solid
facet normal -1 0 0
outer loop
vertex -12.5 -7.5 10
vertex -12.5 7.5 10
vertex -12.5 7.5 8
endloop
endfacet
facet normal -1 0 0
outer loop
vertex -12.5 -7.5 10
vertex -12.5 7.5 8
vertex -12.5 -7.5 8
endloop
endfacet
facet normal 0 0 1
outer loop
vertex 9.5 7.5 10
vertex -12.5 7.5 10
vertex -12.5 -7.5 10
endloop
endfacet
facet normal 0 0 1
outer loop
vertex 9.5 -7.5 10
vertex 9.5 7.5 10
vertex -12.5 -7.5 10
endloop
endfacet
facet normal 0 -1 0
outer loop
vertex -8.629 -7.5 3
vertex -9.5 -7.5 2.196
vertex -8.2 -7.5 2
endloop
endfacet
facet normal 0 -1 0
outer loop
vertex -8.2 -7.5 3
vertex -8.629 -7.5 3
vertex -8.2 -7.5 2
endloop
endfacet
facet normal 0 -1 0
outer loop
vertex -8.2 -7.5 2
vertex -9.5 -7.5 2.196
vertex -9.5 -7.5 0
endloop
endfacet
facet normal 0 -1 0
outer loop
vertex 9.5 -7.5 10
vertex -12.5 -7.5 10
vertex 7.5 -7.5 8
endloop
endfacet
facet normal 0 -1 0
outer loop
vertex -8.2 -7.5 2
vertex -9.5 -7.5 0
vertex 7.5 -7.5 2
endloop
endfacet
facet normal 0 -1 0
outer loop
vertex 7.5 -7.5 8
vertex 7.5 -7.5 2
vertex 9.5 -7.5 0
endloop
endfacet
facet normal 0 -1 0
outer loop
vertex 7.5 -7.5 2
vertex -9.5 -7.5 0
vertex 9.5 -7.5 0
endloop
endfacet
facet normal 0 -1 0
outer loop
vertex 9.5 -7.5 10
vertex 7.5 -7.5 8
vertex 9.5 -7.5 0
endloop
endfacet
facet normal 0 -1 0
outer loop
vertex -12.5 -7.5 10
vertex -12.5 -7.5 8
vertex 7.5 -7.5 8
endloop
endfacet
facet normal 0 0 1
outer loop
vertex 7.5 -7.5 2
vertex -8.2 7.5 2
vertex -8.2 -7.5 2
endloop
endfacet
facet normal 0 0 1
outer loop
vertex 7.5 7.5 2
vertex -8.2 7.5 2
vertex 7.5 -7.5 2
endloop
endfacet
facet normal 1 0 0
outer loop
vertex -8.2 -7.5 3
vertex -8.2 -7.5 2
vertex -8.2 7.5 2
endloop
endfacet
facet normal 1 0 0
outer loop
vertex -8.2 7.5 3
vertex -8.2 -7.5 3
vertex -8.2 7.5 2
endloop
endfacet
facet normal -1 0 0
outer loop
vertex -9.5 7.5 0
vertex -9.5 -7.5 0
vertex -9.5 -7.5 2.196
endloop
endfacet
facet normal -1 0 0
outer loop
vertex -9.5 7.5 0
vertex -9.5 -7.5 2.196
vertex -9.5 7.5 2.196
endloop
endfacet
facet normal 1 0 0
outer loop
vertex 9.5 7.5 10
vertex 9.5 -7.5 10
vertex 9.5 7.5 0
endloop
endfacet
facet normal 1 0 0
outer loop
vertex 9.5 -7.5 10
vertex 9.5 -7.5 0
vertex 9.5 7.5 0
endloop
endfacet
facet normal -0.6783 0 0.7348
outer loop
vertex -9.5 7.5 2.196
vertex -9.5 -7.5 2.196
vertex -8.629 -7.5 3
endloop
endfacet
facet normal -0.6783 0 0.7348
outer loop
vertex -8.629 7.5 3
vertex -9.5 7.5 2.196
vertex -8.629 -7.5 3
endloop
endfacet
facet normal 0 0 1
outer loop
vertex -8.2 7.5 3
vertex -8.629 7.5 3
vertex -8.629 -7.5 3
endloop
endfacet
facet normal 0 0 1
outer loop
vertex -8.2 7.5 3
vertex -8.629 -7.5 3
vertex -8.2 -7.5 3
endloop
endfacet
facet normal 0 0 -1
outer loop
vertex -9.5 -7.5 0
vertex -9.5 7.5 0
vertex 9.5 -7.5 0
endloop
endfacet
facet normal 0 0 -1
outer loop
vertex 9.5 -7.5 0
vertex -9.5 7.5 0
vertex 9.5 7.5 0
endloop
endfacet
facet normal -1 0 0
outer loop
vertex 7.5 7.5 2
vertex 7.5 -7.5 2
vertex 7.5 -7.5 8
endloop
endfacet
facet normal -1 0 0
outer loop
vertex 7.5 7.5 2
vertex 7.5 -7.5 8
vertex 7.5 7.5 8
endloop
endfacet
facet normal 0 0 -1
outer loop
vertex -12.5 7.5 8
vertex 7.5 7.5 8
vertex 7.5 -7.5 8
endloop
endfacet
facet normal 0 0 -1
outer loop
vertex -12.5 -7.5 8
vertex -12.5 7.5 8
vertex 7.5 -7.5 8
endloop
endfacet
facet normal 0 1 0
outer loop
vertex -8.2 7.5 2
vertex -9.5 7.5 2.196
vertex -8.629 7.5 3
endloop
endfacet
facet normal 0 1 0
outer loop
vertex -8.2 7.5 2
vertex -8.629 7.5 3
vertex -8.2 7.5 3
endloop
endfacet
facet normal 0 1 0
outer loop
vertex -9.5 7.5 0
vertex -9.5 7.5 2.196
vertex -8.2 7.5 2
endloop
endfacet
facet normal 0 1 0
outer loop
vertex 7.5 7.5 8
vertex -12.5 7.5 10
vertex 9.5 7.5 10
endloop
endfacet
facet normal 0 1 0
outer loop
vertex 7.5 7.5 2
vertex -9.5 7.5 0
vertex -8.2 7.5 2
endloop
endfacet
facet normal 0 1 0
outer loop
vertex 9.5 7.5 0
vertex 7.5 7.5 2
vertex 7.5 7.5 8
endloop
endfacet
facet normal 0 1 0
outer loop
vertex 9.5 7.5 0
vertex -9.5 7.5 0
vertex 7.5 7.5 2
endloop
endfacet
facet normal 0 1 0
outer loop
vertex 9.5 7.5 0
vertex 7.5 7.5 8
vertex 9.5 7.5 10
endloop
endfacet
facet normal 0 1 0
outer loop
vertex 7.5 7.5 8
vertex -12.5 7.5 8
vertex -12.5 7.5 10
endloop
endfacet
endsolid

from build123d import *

# Parameters (mm, degrees)
F0_W     = 19
F0_H     = 15
F1_DEPTH = 2
F2_W     = 2
F2_H     = 15
F3_DEPTH = 8
F4_W     = 15
F4_H     = 2
F5_DEPTH = 20
F6_W     = 1.3
F6_H     = 15
F7_DEPTH = 1
F9_DEPTH = 25


with BuildPart() as f1:
    # F0 (on Top) → F1 (new body)
    with BuildSketch(Plane.XY):
        Rectangle(F0_W, F0_H)
    extrude(amount=F1_DEPTH)

    # F2 (on face) → F3 (join)
    with BuildSketch(Plane.XY.offset(2)):
        with Locations((8.5, 0)):
            Rectangle(F2_W, F2_H)
    extrude(amount=F3_DEPTH)

    # F4 (on face) → F5 (join)
    with BuildSketch(Plane(origin=(7.5, 0, 0), x_dir=(0, -1, 0), z_dir=(-1, 0, 0))):
        with Locations((0, 9)):
            Rectangle(F4_W, F4_H)
    extrude(amount=F5_DEPTH)

    # F6 (on face) → F7 (join)
    with BuildSketch(Plane.XY.offset(2)):
        with Locations((-8.85, 0)):
            Rectangle(F6_W, F6_H)
    extrude(amount=F7_DEPTH)

    # F8 (on face) → F9 (cut)
    with BuildSketch(Plane.XZ.offset(7.5)):
        Polygon((-9.5, 3), (-9.5, 2.195644), (-8.629206, 3), align=None)
    extrude(amount=-F9_DEPTH, mode=Mode.SUBTRACT)


solid = f1.part
